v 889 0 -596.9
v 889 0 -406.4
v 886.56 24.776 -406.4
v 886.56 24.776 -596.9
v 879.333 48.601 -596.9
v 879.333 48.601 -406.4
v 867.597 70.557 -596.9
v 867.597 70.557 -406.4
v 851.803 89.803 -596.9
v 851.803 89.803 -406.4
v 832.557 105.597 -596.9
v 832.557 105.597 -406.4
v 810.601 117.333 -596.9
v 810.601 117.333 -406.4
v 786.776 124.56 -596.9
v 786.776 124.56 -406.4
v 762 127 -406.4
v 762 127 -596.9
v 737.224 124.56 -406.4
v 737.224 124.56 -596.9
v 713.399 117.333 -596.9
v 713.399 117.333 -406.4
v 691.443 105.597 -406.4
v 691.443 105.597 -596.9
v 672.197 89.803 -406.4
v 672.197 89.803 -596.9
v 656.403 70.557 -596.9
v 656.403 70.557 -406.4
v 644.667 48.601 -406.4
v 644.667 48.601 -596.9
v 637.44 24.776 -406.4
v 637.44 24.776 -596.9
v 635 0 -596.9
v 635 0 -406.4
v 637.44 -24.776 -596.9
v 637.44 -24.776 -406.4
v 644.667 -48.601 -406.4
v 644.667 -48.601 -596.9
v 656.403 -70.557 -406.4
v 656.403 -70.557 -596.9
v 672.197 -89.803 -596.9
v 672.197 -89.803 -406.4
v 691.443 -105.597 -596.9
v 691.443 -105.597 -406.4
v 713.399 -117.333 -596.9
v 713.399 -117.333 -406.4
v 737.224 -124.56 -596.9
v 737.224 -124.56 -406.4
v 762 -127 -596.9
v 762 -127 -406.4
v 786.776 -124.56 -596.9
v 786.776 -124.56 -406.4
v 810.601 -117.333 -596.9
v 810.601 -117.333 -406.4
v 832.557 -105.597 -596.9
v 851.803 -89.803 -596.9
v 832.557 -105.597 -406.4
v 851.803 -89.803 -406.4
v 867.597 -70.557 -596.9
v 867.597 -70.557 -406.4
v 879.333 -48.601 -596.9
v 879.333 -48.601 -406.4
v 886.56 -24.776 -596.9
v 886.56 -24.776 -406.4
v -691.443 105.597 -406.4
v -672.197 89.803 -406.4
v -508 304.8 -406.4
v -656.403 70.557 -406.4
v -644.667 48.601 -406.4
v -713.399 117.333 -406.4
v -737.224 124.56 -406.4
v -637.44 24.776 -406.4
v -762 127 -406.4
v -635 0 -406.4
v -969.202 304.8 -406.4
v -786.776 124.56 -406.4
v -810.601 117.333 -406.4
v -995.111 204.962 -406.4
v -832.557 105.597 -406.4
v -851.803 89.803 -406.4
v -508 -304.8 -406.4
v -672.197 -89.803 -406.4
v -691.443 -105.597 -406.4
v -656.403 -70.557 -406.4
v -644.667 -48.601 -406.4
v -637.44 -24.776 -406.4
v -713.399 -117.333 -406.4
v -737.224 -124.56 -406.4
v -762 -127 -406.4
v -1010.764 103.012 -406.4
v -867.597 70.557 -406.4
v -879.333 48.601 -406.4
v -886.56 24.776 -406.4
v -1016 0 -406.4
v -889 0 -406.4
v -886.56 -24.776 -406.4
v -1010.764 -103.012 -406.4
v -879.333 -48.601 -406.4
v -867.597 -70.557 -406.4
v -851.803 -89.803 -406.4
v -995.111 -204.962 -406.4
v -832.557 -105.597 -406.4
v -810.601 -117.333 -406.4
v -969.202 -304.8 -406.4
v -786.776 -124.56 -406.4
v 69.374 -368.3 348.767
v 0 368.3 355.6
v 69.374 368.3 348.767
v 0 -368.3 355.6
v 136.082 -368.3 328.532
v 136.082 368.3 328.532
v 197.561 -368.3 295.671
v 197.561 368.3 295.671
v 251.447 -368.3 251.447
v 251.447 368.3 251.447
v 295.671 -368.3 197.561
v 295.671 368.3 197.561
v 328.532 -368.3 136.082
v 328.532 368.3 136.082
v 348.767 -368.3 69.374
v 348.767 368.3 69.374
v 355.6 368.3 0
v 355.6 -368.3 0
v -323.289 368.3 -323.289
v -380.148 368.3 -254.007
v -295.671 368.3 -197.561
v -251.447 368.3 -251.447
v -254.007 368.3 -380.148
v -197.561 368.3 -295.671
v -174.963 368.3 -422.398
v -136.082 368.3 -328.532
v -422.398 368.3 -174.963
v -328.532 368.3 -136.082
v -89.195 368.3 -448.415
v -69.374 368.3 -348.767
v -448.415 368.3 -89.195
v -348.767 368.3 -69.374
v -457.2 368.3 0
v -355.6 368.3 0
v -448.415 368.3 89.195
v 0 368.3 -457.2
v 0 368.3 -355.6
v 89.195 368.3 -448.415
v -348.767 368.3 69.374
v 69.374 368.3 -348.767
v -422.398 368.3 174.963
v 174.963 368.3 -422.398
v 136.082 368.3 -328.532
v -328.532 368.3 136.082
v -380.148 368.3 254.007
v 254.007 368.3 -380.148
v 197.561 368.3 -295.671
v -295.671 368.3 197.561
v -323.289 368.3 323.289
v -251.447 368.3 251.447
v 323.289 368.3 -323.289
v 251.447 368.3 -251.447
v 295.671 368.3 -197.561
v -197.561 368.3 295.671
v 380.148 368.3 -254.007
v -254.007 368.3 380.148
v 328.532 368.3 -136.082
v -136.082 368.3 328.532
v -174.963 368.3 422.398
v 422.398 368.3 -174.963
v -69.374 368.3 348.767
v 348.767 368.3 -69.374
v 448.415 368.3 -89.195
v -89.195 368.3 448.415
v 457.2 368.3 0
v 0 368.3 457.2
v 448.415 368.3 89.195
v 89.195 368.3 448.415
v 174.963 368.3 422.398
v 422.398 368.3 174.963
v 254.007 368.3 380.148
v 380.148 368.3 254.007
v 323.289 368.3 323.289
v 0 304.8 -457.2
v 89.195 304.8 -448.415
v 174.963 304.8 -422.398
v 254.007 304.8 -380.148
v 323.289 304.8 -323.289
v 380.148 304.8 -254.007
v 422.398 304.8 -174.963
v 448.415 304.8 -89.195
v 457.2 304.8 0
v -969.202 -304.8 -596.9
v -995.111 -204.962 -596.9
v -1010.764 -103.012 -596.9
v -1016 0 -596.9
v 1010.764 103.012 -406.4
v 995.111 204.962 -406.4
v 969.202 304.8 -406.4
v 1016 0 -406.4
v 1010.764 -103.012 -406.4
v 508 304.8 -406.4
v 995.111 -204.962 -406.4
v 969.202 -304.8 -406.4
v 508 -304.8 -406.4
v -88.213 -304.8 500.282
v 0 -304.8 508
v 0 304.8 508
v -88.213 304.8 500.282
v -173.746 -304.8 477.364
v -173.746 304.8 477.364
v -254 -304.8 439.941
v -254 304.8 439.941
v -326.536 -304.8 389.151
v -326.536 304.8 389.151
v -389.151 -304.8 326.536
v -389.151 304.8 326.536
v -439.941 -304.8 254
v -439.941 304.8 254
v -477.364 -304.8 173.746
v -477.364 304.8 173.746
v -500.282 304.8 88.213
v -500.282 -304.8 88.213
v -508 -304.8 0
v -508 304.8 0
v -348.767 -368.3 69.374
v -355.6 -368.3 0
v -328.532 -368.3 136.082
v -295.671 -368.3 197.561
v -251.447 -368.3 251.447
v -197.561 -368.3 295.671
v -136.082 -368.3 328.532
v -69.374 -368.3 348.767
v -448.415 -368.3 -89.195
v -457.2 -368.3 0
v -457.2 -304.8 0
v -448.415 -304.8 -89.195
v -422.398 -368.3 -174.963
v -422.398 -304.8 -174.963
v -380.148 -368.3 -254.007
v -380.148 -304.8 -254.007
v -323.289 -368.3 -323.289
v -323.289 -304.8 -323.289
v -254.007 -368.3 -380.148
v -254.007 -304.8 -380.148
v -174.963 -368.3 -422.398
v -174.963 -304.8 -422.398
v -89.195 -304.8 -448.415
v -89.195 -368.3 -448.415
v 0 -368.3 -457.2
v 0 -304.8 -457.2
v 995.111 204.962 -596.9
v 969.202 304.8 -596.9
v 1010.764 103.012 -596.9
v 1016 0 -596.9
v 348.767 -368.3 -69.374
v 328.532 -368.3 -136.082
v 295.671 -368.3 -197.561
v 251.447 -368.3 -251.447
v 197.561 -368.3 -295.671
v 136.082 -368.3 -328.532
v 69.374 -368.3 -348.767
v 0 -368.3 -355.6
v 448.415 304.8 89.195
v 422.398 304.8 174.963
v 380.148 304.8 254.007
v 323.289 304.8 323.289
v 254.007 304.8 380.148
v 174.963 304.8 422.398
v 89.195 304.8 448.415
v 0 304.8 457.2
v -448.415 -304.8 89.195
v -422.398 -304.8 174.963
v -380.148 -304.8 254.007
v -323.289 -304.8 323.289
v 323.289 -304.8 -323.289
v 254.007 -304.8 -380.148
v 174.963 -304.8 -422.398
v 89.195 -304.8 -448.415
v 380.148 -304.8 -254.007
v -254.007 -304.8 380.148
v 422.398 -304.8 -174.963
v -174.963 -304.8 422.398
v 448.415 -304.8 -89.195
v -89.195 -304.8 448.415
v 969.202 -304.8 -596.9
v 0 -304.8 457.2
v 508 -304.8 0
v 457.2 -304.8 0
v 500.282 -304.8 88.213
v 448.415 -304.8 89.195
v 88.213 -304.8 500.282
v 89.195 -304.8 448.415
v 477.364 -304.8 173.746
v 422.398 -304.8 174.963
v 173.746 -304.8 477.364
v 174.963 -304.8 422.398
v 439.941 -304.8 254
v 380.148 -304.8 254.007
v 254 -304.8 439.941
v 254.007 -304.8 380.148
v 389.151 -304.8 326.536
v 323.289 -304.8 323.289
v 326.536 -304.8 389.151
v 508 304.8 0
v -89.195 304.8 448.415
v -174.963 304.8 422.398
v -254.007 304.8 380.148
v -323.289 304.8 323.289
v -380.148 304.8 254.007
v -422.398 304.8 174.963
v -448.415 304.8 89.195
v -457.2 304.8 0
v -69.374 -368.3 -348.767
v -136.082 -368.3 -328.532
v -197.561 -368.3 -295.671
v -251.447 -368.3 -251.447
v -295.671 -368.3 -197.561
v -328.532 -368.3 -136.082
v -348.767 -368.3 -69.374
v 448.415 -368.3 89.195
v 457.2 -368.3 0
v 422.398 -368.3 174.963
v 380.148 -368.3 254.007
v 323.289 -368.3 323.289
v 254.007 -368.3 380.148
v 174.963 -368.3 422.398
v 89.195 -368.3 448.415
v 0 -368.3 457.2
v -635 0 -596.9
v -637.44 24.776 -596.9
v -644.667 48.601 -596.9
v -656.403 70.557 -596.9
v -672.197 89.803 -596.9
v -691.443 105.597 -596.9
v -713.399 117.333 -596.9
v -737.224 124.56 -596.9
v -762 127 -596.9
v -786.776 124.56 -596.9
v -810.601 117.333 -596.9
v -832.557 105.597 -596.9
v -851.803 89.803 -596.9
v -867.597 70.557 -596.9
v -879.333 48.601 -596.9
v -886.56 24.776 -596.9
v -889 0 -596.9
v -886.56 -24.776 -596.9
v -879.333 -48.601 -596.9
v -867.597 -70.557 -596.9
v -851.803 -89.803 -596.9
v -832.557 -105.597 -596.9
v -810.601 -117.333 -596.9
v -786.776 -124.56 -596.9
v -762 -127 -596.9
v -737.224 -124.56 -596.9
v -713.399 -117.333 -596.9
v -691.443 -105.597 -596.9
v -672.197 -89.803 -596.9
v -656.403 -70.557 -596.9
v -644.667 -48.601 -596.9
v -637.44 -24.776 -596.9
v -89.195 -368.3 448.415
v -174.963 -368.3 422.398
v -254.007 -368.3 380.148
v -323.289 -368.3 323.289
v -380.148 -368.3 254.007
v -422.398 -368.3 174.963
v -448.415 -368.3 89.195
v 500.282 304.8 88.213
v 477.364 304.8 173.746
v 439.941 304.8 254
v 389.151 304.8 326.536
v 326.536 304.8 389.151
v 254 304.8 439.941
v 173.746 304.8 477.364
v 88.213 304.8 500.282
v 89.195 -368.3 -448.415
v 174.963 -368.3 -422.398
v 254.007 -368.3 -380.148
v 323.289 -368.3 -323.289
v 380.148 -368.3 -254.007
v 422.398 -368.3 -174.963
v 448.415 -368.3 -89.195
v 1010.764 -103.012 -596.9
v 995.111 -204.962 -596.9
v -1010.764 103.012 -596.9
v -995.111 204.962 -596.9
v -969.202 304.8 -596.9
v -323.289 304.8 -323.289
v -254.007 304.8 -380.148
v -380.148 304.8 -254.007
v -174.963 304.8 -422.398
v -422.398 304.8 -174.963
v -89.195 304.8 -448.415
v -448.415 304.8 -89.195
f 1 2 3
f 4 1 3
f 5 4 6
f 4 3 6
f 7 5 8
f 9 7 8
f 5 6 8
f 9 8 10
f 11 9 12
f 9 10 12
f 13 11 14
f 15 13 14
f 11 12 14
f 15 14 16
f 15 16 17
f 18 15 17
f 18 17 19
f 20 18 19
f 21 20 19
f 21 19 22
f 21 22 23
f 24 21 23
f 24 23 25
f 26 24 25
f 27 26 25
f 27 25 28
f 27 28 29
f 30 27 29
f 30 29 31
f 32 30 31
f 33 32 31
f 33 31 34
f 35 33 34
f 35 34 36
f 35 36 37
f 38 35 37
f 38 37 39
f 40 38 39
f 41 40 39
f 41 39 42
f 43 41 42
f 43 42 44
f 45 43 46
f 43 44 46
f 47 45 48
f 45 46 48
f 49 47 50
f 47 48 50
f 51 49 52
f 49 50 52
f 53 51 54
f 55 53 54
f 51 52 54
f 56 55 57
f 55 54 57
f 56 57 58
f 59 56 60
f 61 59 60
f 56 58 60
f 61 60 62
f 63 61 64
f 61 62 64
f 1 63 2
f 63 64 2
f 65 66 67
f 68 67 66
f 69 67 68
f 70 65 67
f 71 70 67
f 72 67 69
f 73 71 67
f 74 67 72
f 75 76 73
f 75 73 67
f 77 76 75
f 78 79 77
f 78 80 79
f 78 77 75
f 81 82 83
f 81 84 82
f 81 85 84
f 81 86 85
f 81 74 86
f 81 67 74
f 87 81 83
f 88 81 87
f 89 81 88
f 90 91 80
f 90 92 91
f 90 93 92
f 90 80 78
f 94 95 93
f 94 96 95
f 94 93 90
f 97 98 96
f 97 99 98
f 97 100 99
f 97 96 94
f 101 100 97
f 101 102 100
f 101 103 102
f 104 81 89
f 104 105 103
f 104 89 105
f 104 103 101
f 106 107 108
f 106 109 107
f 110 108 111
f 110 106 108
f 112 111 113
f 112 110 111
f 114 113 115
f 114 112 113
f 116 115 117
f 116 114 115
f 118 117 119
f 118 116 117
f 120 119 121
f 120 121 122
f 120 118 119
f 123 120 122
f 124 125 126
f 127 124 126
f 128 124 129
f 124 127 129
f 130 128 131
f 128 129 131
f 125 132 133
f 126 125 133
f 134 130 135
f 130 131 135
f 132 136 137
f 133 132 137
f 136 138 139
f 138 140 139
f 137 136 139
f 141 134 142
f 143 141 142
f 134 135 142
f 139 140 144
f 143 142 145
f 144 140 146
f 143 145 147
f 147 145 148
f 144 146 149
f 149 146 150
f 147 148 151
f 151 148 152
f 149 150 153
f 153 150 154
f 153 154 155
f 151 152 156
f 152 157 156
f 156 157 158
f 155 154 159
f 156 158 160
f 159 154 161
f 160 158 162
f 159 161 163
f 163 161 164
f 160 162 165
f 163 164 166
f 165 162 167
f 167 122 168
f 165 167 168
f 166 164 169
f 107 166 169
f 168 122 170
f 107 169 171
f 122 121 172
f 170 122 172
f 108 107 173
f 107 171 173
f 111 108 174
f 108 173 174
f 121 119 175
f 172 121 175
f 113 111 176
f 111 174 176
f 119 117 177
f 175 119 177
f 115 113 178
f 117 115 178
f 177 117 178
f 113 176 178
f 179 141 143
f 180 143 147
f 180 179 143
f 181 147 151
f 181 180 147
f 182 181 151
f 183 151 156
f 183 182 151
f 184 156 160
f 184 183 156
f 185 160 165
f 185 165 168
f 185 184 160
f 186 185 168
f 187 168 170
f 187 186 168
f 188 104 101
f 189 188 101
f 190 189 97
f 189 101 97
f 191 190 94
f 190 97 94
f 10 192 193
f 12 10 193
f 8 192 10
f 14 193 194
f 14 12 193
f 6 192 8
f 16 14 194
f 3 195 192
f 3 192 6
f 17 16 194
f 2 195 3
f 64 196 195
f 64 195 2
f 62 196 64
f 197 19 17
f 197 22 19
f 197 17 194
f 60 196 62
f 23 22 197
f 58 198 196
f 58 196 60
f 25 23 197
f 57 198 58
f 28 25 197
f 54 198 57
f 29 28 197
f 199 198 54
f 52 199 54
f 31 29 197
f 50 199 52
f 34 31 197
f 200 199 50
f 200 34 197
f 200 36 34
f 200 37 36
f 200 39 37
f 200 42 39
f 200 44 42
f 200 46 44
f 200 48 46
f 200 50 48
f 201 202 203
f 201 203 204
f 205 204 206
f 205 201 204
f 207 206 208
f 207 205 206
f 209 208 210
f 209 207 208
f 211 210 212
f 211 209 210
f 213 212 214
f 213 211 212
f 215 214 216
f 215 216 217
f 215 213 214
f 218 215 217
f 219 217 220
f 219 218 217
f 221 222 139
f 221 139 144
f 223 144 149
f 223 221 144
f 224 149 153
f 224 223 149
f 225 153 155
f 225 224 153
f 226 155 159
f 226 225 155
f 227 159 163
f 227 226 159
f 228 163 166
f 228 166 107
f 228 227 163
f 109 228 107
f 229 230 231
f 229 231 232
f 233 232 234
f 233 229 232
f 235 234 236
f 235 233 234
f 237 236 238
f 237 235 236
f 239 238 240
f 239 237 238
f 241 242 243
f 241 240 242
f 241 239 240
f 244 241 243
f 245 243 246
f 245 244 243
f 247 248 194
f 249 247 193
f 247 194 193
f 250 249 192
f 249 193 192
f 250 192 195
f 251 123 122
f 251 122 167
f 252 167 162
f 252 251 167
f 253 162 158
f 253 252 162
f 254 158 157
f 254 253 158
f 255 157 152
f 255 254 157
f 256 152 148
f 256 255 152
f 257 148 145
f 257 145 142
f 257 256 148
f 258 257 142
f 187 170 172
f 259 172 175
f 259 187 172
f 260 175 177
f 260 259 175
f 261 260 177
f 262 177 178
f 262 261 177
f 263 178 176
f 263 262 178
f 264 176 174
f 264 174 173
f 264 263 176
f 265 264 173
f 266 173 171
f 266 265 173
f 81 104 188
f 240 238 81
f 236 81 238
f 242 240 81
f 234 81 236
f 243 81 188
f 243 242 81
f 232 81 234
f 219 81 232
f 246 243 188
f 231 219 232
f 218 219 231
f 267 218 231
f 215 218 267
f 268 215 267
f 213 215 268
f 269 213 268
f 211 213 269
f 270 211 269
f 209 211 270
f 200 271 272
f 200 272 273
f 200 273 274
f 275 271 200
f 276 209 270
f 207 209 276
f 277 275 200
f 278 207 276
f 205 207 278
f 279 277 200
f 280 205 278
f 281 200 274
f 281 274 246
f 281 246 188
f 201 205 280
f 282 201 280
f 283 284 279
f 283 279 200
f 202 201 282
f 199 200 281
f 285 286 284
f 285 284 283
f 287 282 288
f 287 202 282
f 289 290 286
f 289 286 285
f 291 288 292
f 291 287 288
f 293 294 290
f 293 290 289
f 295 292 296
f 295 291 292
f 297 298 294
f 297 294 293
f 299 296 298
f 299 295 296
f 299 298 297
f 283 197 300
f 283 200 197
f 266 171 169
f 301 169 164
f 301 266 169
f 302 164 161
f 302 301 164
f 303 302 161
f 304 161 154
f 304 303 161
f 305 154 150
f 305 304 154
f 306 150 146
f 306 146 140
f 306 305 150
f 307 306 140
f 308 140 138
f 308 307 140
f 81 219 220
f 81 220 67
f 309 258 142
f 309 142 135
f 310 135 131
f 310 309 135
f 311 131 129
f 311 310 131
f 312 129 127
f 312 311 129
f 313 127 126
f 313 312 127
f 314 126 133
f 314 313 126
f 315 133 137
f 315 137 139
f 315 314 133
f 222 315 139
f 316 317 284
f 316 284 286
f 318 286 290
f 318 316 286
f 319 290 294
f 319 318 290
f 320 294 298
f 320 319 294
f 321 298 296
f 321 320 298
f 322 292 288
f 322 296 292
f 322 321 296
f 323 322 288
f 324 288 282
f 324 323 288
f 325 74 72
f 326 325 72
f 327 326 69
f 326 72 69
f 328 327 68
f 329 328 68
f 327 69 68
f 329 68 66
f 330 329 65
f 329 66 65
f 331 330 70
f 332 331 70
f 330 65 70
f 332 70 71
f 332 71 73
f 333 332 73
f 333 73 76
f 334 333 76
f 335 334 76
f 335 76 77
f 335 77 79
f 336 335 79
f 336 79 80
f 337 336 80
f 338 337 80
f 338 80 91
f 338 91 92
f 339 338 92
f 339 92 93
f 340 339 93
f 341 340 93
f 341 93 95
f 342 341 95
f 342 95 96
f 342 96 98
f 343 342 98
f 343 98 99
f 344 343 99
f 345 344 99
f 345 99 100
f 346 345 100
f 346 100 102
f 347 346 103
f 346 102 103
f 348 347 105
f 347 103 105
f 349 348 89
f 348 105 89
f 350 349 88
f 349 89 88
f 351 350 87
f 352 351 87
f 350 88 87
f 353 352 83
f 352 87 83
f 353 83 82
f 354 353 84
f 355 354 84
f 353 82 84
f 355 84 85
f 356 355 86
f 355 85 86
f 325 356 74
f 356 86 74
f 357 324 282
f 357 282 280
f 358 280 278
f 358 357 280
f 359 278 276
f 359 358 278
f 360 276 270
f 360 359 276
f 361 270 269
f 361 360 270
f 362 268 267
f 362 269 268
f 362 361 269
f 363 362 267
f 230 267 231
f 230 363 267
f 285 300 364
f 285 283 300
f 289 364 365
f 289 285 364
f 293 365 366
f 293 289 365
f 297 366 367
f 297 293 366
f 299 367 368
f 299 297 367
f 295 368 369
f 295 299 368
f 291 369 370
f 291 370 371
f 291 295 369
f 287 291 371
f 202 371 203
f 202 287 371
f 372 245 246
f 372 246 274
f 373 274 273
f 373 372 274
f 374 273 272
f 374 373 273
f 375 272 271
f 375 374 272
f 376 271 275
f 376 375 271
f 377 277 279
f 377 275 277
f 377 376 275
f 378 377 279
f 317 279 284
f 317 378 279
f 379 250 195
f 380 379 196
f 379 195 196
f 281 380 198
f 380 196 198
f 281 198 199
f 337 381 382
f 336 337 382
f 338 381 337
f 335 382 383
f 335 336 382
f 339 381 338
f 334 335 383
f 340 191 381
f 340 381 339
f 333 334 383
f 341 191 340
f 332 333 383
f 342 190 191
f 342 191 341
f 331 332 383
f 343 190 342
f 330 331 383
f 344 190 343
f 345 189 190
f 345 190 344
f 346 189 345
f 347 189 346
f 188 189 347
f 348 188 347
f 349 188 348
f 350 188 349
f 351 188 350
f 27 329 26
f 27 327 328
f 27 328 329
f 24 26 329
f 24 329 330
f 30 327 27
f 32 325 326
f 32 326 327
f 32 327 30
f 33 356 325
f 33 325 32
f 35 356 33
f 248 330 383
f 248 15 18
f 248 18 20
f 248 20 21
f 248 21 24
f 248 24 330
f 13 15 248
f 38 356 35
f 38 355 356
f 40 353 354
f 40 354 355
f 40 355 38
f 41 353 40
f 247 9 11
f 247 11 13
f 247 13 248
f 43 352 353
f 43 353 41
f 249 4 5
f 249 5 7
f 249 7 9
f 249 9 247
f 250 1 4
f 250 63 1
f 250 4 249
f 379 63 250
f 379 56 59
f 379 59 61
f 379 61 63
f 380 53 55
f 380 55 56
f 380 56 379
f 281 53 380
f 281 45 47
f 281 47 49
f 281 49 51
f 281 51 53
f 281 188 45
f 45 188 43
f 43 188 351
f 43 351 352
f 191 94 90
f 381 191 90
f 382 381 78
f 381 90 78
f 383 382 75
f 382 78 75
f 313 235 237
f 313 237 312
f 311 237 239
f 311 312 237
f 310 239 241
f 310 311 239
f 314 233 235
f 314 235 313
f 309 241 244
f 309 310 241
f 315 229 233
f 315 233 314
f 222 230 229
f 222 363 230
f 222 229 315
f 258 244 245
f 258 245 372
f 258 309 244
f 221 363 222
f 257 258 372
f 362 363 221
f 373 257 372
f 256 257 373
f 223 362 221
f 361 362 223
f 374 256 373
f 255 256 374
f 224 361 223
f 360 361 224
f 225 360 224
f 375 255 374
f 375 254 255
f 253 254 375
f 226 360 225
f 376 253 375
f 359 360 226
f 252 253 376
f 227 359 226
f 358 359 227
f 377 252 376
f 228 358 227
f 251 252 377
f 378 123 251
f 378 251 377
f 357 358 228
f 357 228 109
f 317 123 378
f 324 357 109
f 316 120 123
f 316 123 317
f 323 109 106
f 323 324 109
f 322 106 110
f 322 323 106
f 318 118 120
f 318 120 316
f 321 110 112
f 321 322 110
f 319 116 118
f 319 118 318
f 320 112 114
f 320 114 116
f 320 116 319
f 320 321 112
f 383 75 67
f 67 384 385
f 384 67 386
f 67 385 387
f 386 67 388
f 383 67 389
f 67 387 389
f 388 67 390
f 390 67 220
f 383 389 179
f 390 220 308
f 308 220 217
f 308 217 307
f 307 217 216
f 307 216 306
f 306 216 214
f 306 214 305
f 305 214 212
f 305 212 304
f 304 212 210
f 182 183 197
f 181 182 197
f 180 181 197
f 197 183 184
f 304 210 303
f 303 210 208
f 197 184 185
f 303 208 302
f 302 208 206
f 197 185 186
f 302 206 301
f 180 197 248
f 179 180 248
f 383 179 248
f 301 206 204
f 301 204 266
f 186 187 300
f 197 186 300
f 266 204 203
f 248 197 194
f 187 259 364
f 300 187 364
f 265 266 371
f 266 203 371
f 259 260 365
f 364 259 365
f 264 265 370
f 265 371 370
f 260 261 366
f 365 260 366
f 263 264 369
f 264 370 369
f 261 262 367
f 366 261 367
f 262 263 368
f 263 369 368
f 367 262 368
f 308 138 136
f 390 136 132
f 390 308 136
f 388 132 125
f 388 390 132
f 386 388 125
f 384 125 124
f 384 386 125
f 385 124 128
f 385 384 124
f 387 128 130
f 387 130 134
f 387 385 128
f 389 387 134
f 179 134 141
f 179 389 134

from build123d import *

# Parameters (mm, degrees)
F1_DEPTH = 304.8
F2_DEPTH = 368.3
F3_R     = 127
F4_DEPTH = 596.9
F5_R     = 127
F6_DEPTH = 190.501


with BuildPart() as f1:
    # F0 (on Front) → F1 (new body, symmetric)
    with BuildSketch(Plane.XZ):
        with BuildLine():
            Line((457.2, 0), (508, 0))
            ThreePointArc((508, 0), (359.210245, 359.210245), (0, 508))
            Line((0, 508), (0, 457.2))
            ThreePointArc((0, 457.2), (323.28922, 323.28922), (457.2, 0))
        make_face()
        with BuildLine():
            Line((508, -406.4), (508, 0))
            Line((508, 0), (457.2, 0))
            ThreePointArc((457.2, 0), (323.28922, -323.28922), (0, -457.2))
            ThreePointArc((0, -457.2), (-323.28922, -323.28922), (-457.2, 0))
            Line((-457.2, 0), (-508, 0))
            Line((-508, 0), (-508, -406.4))
            Line((-508, -406.4), (-1016, -406.4))
            Line((-1016, -406.4), (-1016, -596.9))
            Line((-1016, -596.9), (1016, -596.9))
            Line((1016, -596.9), (1016, -406.4))
            Line((1016, -406.4), (508, -406.4))
        make_face()
        with BuildLine():
            Line((0, 457.2), (0, 508))
            ThreePointArc((0, 508), (-359.210245, 359.210245), (-508, 0))
            Line((-508, 0), (-457.2, 0))
            ThreePointArc((-457.2, 0), (-323.28922, 323.28922), (0, 457.2))
        make_face()
    extrude(amount=F1_DEPTH, both=True)

    # F0 (on Front) → F2 (join, symmetric)
    with BuildSketch(Plane.XZ):
        with BuildLine():
            ThreePointArc((-457.2, 0), (-323.28922, -323.28922), (0, -457.2))
            Line((0, -457.2), (0, -355.6))
            ThreePointArc((0, -355.6), (-251.447171, -251.447171), (-355.6, 0))
            Line((-355.6, 0), (-457.2, 0))
        make_face()
        with BuildLine():
            ThreePointArc((0, -457.2), (323.28922, -323.28922), (457.2, 0))
            Line((457.2, 0), (355.6, 0))
            ThreePointArc((355.6, 0), (251.447171, -251.447171), (0, -355.6))
            Line((0, -355.6), (0, -457.2))
        make_face()
        with BuildLine():
            Line((355.6, 0), (457.2, 0))
            ThreePointArc((457.2, 0), (323.28922, 323.28922), (0, 457.2))
            Line((0, 457.2), (0, 355.6))
            ThreePointArc((0, 355.6), (251.447171, 251.447171), (355.6, 0))
        make_face()
        with BuildLine():
            Line((0, 355.6), (0, 457.2))
            ThreePointArc((0, 457.2), (-323.28922, 323.28922), (-457.2, 0))
            Line((-457.2, 0), (-355.6, 0))
            ThreePointArc((-355.6, 0), (-251.447171, 251.447171), (0, 355.6))
        make_face()
    extrude(amount=F2_DEPTH, both=True)

    # F3 (on face) → F4 (cut)
    with BuildSketch(Plane.XY.offset(-406.4)):
        with Locations((-762, 0)):
            Circle(F3_R)
        with BuildLine():
            ThreePointArc((-969.202229, -304.8), (-1004.232409, -154.185825), (-1016, -5e-06))
            Line((-1016, -5e-06), (-1016, -304.8))
            Line((-1016, -304.8), (-969.202229, -304.8))
        make_face()
        with BuildLine():
            ThreePointArc((-1016, -5e-06), (-1004.23241, 154.18582), (-969.202229, 304.8))
            Line((-969.202229, 304.8), (-1016, 304.8))
            Line((-1016, 304.8), (-1016, -5e-06))
        make_face()
    extrude(amount=-F4_DEPTH, mode=Mode.SUBTRACT)

    # F5 (on face) → F6 (cut, through all)
    with BuildSketch(Plane.XY.offset(-406.4)):
        with BuildLine():
            ThreePointArc((969.202229, 304.8), (1004.232409, 154.185822), (1016, 0))
            Line((1016, 0), (1016, 304.8))
            Line((1016, 304.8), (969.202229, 304.8))
        make_face()
        with BuildLine():
            ThreePointArc((1016, 0), (1004.232409, -154.185822), (969.202229, -304.8))
            Line((969.202229, -304.8), (1016, -304.8))
            Line((1016, -304.8), (1016, 0))
        make_face()
        with Locations((762, 0)):
            Circle(F5_R)
    extrude(amount=-F6_DEPTH, mode=Mode.SUBTRACT)


solid = f1.part
